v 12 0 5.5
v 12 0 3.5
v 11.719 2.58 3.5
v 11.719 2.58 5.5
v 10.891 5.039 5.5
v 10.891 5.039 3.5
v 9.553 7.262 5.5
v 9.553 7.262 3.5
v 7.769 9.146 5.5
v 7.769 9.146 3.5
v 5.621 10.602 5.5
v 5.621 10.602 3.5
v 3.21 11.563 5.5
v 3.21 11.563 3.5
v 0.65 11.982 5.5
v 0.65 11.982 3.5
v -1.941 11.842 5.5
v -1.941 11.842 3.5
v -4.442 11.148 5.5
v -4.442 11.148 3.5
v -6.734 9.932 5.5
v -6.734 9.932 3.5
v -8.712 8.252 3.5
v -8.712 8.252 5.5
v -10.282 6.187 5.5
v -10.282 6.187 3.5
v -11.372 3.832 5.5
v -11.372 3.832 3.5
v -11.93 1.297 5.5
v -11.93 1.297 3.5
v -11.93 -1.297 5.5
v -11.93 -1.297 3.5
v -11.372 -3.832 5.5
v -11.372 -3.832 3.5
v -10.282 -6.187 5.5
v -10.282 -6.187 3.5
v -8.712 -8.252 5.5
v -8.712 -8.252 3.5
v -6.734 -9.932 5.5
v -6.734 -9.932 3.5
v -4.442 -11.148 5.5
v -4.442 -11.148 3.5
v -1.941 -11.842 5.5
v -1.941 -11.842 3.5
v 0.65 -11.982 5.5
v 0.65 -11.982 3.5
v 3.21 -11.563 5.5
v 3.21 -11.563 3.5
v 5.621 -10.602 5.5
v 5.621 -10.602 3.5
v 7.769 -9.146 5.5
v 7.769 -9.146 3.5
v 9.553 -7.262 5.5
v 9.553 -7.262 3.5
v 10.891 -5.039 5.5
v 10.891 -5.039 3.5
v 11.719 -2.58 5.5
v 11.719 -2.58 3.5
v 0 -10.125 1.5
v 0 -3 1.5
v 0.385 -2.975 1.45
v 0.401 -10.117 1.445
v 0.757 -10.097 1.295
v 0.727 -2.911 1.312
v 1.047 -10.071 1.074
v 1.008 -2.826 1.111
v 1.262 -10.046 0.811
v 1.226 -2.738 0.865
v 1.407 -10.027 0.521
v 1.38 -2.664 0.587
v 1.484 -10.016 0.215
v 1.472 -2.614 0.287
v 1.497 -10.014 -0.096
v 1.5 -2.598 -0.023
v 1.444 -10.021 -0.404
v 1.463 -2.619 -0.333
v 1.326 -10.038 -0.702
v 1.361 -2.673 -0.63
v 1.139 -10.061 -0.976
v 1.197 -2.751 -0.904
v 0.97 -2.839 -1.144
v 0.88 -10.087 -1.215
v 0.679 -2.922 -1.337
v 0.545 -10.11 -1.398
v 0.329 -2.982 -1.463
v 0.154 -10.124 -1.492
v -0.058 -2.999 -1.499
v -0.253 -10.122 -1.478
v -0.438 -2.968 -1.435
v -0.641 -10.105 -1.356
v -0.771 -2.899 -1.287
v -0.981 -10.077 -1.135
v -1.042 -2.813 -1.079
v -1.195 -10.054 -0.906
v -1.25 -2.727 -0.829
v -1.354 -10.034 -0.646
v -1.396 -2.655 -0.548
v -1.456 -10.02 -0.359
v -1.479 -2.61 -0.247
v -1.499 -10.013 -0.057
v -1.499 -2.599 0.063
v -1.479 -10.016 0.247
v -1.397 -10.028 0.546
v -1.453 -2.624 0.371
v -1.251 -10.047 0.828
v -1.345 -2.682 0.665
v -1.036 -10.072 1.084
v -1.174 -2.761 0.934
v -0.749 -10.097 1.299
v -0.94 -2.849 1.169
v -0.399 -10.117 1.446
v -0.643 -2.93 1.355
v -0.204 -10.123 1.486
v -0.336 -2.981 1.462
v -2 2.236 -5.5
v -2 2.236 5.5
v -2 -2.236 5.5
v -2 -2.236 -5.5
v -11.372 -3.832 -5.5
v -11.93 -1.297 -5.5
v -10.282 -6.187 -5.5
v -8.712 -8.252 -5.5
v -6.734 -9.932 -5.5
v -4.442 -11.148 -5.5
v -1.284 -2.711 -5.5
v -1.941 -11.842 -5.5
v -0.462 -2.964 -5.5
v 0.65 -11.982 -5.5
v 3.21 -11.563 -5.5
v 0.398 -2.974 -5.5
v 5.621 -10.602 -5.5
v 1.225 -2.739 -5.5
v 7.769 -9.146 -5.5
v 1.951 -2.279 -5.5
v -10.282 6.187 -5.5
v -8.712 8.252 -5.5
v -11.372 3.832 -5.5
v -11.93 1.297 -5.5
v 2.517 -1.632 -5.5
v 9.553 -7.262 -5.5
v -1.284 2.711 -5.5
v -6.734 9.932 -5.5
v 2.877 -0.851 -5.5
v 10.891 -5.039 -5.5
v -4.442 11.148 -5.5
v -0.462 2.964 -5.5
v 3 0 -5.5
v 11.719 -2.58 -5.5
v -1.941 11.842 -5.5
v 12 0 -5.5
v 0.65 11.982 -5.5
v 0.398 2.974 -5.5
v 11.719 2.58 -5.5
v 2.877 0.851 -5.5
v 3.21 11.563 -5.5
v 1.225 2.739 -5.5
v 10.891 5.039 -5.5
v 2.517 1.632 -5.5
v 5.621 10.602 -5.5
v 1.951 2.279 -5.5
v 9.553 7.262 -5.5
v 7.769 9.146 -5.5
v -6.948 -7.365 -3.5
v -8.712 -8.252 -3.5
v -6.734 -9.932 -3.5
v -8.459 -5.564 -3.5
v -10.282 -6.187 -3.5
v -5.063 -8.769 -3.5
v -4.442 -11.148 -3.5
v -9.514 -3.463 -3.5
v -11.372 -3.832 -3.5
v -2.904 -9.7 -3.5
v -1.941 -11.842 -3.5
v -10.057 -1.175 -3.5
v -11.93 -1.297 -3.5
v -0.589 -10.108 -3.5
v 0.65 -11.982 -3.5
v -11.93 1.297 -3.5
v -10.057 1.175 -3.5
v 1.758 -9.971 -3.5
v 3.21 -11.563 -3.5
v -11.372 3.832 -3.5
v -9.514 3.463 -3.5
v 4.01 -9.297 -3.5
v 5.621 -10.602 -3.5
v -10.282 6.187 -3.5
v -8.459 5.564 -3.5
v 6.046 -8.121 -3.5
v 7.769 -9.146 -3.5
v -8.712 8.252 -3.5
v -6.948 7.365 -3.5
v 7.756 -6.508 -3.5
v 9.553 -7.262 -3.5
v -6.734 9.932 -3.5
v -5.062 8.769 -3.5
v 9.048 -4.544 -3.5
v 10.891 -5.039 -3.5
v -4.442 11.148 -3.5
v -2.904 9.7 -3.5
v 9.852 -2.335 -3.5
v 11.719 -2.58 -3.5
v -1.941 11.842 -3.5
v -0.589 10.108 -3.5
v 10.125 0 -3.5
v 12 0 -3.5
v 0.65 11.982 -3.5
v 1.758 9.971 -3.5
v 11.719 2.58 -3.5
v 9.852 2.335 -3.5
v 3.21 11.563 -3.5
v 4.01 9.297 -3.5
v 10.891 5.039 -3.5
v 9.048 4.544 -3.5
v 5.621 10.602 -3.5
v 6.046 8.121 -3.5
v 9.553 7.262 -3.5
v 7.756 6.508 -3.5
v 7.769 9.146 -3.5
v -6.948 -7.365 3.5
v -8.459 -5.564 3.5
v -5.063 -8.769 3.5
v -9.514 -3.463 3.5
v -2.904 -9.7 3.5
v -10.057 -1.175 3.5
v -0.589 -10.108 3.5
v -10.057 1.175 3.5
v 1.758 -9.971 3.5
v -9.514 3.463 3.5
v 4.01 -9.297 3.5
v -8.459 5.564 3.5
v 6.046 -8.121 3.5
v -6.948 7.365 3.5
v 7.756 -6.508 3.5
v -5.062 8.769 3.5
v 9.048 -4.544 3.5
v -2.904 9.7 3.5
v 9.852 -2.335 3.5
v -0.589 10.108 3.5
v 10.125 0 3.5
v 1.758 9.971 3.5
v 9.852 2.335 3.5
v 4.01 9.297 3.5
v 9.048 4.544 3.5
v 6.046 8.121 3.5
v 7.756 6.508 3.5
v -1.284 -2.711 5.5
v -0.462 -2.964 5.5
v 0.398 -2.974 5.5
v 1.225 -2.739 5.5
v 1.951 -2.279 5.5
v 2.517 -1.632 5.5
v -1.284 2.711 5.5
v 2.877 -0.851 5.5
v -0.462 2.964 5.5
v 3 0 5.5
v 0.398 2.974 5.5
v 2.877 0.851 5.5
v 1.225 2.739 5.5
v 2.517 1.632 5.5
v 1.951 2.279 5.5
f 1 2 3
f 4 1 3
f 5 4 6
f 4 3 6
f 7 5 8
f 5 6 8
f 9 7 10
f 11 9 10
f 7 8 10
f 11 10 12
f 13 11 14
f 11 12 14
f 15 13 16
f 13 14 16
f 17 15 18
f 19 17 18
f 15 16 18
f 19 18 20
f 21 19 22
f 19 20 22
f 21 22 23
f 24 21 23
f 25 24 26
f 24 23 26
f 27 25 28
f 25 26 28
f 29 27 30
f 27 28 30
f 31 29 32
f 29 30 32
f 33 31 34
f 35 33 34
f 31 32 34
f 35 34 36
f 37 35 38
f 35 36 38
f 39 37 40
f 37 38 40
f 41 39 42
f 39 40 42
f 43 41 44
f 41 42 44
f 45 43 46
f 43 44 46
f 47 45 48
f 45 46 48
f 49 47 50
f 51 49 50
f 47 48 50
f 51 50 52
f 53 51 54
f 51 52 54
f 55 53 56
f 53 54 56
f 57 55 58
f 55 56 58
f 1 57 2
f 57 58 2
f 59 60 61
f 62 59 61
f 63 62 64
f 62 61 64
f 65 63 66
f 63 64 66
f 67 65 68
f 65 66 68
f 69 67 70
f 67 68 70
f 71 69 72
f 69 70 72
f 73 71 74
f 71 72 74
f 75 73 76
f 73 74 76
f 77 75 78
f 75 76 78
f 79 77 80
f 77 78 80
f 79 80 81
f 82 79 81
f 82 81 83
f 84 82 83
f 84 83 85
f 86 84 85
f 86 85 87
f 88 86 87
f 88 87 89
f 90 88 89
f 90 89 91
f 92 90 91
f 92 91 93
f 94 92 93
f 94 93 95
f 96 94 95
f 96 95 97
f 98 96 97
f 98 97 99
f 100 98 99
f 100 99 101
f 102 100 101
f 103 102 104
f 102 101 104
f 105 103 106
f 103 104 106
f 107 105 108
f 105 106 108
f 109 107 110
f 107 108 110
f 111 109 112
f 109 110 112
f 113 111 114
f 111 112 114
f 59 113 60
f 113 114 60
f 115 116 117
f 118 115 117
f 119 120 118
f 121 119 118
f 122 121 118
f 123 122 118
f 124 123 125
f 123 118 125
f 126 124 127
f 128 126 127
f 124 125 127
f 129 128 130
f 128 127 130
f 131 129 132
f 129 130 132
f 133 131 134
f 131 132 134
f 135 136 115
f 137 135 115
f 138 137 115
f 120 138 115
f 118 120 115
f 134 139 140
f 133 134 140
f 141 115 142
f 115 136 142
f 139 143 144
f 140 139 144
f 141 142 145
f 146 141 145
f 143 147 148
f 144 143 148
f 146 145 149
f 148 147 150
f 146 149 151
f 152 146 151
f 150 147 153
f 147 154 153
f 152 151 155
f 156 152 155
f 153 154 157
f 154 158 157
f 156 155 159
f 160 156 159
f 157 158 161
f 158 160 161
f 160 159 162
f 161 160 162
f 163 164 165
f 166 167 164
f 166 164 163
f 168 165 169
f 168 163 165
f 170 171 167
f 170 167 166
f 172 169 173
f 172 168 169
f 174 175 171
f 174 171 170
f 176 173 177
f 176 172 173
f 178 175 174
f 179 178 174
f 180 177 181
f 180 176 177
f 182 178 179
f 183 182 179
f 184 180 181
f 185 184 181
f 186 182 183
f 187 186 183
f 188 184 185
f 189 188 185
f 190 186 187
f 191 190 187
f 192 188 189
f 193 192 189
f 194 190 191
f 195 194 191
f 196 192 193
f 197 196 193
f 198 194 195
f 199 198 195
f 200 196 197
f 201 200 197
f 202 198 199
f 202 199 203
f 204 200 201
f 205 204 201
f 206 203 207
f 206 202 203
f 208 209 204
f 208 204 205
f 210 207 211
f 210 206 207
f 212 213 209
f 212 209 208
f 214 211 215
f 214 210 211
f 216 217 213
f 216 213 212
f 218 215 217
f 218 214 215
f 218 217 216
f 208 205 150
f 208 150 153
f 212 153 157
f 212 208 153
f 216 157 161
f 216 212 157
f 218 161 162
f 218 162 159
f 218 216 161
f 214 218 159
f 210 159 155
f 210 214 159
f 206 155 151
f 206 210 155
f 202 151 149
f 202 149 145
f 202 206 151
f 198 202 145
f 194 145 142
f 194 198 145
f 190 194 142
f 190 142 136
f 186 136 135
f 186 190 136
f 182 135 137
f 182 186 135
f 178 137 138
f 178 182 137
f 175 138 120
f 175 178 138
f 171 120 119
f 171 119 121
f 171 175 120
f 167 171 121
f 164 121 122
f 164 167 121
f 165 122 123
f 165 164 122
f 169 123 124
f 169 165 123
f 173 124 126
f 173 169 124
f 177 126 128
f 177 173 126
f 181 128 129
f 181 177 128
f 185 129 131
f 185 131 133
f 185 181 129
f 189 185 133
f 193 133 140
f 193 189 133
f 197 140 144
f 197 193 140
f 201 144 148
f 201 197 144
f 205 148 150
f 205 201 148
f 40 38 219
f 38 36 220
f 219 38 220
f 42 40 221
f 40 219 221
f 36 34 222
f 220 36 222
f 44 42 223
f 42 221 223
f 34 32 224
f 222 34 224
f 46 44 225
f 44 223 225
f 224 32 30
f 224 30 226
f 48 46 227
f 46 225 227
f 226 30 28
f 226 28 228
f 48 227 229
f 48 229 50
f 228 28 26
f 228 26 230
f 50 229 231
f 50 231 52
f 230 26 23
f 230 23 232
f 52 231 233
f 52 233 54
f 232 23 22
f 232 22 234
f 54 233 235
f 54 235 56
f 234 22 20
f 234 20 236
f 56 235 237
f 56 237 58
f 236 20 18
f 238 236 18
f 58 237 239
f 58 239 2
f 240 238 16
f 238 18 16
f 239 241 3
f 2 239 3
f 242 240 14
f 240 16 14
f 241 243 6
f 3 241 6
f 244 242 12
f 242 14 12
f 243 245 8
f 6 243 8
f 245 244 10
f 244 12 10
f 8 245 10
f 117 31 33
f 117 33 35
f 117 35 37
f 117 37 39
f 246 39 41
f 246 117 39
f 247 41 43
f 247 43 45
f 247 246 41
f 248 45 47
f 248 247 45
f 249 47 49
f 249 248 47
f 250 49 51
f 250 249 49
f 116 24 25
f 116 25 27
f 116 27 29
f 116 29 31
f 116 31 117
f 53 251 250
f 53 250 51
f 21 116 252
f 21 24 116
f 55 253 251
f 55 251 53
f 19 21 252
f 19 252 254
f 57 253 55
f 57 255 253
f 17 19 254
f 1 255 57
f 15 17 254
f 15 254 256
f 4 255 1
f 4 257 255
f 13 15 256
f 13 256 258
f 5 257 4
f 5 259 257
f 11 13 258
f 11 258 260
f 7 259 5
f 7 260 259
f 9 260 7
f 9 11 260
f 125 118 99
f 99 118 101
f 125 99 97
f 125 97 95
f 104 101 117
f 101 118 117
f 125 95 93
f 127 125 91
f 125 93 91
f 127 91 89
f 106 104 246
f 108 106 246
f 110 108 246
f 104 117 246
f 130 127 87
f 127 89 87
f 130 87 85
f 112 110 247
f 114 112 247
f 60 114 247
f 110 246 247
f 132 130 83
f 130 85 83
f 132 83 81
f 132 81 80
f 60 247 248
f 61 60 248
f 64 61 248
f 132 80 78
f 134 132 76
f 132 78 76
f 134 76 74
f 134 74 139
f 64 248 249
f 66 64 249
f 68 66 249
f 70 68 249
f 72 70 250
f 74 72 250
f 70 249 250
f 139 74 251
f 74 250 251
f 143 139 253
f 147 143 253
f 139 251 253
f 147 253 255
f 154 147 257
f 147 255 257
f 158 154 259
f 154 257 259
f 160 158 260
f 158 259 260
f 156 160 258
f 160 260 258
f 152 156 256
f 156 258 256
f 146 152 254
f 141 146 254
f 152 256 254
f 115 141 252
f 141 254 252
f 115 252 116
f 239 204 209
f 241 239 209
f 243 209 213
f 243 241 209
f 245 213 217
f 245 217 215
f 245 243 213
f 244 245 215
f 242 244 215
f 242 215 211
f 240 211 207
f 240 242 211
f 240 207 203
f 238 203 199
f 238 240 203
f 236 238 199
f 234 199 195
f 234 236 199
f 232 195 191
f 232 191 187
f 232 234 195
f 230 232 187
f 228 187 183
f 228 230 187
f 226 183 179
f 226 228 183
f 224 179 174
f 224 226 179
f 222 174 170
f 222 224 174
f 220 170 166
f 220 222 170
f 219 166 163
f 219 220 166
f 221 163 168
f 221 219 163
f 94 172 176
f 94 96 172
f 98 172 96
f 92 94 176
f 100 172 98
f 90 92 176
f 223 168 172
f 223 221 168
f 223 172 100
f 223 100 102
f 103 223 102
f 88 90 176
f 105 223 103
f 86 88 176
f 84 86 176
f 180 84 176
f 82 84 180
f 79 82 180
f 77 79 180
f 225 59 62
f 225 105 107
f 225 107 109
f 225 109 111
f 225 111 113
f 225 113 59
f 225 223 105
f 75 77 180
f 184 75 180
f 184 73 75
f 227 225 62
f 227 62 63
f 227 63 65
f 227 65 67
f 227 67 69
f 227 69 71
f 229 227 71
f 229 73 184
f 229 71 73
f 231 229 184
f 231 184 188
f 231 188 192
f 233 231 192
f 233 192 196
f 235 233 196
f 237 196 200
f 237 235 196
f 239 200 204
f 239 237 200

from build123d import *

# Parameters (mm, degrees)
SKETCH_1_R          = 10.125
EXTRUDE_1_DEPTH     = 3.5
SKETCH_2_R          = 12
EXTRUDE_2_DEPTH     = 2
CUT_EXTRUDE_1_DEPTH = 21.223748416
SKETCH_4_R          = 1.5
CUT_EXTRUDE_2_DEPTH = 18.839562775


with BuildPart() as part:
    # 草图1 → 凸台-拉伸1 (new, symmetric)
    with BuildSketch(Plane.XY):
        Circle(SKETCH_1_R)
    extrude(amount=EXTRUDE_1_DEPTH, both=True)

    # 草图2 → 凸台-拉伸2 (add)
    with BuildSketch(Plane.XY.offset(3.5)):
        Circle(SKETCH_2_R)
    extrude_2 = extrude(amount=EXTRUDE_2_DEPTH)

    # 镜向1: 凸台-拉伸2 across plane
    add(extrude_2.mirror(Plane.XY))

    # 草图3 → 切除-拉伸1 (cut, through all)
    with BuildSketch(Plane.XY.offset(5.5)):
        with BuildLine():
            Line((-2, 2.236067977), (-2, -2.236067977))
            ThreePointArc((-2, -2.236067977), (3, 0), (-2, 2.236067977))
        make_face()
    extrude(amount=-CUT_EXTRUDE_1_DEPTH, mode=Mode.SUBTRACT)

    # 草图4 → 切除-拉伸2 (cut, through all)
    with BuildSketch(Plane(origin=(0, 0, 0), x_dir=(1, 0, 0), z_dir=(0, 1, 0))):
        with Locations(Location((0, 0, 0), (0, 0, 270))):
            Circle(SKETCH_4_R)
    extrude(amount=-CUT_EXTRUDE_2_DEPTH, mode=Mode.SUBTRACT)


solid = part.part
